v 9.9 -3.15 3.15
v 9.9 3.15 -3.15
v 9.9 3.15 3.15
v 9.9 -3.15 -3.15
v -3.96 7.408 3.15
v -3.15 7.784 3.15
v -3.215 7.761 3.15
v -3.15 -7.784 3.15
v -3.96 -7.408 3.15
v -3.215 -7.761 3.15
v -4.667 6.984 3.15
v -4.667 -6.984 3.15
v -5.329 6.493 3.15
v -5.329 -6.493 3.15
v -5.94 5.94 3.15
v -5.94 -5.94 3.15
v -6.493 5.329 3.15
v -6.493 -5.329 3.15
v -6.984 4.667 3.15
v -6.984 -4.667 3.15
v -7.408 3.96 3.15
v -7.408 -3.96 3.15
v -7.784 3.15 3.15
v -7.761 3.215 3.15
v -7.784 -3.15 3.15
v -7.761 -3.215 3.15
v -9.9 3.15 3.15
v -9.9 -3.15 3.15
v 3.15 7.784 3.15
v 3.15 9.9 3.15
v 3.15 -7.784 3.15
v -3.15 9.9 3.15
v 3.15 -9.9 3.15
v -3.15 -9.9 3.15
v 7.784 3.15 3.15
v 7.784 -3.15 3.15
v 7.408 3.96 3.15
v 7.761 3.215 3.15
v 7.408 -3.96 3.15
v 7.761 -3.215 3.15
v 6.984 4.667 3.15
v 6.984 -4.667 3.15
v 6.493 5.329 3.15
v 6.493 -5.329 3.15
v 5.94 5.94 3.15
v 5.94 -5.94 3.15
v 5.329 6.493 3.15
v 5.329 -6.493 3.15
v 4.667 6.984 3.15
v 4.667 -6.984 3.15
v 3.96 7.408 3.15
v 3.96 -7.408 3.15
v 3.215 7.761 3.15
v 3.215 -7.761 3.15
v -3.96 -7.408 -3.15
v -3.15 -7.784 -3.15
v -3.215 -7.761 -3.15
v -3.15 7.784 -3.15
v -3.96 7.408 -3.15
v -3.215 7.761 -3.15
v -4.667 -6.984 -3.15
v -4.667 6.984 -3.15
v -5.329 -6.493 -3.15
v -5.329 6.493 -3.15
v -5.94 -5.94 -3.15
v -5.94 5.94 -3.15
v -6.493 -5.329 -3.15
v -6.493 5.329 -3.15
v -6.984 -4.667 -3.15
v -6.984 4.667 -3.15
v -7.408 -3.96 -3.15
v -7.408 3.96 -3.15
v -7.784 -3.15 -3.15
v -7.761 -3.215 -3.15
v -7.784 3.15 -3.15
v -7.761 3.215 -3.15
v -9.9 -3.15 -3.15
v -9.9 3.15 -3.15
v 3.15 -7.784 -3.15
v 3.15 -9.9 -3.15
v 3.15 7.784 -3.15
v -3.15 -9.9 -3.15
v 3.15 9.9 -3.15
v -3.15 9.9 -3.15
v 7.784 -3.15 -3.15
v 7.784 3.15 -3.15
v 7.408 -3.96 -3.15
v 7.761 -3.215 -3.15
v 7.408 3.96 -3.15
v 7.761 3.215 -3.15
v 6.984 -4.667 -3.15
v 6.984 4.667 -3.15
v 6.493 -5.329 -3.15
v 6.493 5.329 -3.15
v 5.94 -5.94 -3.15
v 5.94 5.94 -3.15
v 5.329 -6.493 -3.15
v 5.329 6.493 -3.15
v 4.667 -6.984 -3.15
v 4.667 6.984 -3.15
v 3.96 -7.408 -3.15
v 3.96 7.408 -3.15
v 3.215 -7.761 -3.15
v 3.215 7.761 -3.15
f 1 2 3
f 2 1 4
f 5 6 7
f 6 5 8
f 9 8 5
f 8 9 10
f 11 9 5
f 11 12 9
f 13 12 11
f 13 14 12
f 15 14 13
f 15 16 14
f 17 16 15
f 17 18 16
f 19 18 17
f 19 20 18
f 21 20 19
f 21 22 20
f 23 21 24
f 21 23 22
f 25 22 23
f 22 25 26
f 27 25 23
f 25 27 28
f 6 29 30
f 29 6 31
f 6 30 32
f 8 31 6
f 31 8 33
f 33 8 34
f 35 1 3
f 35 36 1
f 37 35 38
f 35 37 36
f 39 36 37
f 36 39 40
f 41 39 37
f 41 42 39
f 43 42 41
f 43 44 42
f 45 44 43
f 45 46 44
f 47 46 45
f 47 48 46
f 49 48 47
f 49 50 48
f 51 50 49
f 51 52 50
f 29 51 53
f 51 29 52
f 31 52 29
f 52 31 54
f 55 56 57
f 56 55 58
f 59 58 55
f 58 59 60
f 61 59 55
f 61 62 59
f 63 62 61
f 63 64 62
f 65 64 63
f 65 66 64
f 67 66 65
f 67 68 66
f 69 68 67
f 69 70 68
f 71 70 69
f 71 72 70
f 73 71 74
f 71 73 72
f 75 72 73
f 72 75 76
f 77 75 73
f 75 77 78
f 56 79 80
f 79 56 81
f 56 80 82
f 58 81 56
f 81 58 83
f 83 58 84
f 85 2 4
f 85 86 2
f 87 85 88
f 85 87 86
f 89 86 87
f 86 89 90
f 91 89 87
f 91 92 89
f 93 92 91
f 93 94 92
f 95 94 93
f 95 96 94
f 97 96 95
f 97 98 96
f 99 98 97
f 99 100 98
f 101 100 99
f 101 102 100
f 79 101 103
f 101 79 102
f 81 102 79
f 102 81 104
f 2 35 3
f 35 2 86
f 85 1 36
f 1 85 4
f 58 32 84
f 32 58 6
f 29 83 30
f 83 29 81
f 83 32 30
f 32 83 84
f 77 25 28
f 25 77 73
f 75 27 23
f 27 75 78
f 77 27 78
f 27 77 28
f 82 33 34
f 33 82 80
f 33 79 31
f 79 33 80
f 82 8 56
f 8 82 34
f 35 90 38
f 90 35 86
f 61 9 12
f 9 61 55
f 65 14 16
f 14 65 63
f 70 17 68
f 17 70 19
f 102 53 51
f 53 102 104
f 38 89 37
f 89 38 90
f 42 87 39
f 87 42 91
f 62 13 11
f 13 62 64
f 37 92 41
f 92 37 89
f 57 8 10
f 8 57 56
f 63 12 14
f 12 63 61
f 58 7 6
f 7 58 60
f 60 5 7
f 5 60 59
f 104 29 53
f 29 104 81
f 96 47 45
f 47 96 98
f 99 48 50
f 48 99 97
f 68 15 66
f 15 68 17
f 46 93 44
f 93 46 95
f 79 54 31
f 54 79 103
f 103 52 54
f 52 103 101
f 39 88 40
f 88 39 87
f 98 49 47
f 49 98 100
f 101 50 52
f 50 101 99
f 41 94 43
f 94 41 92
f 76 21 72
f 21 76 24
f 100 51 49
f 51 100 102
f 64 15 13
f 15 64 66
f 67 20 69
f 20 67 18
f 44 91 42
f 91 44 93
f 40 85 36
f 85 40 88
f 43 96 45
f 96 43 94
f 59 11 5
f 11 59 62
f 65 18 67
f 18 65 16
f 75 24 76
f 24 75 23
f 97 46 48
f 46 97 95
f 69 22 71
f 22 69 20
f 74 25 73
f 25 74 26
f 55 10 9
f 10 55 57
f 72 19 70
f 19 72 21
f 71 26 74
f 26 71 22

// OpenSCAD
module lug() {
    cube([3, 6.3, 6.3], center=true);
}

module disk_with_lugs() {
    cylinder(h=6.3, d=16.8, center=true, $fn=64);
    for (angle = [0, 90, 180, 270]) {
        rotate([0, 0, angle])
        translate([8.4, 0, 0])
        lug();
    }
}

disk_with_lugs();
